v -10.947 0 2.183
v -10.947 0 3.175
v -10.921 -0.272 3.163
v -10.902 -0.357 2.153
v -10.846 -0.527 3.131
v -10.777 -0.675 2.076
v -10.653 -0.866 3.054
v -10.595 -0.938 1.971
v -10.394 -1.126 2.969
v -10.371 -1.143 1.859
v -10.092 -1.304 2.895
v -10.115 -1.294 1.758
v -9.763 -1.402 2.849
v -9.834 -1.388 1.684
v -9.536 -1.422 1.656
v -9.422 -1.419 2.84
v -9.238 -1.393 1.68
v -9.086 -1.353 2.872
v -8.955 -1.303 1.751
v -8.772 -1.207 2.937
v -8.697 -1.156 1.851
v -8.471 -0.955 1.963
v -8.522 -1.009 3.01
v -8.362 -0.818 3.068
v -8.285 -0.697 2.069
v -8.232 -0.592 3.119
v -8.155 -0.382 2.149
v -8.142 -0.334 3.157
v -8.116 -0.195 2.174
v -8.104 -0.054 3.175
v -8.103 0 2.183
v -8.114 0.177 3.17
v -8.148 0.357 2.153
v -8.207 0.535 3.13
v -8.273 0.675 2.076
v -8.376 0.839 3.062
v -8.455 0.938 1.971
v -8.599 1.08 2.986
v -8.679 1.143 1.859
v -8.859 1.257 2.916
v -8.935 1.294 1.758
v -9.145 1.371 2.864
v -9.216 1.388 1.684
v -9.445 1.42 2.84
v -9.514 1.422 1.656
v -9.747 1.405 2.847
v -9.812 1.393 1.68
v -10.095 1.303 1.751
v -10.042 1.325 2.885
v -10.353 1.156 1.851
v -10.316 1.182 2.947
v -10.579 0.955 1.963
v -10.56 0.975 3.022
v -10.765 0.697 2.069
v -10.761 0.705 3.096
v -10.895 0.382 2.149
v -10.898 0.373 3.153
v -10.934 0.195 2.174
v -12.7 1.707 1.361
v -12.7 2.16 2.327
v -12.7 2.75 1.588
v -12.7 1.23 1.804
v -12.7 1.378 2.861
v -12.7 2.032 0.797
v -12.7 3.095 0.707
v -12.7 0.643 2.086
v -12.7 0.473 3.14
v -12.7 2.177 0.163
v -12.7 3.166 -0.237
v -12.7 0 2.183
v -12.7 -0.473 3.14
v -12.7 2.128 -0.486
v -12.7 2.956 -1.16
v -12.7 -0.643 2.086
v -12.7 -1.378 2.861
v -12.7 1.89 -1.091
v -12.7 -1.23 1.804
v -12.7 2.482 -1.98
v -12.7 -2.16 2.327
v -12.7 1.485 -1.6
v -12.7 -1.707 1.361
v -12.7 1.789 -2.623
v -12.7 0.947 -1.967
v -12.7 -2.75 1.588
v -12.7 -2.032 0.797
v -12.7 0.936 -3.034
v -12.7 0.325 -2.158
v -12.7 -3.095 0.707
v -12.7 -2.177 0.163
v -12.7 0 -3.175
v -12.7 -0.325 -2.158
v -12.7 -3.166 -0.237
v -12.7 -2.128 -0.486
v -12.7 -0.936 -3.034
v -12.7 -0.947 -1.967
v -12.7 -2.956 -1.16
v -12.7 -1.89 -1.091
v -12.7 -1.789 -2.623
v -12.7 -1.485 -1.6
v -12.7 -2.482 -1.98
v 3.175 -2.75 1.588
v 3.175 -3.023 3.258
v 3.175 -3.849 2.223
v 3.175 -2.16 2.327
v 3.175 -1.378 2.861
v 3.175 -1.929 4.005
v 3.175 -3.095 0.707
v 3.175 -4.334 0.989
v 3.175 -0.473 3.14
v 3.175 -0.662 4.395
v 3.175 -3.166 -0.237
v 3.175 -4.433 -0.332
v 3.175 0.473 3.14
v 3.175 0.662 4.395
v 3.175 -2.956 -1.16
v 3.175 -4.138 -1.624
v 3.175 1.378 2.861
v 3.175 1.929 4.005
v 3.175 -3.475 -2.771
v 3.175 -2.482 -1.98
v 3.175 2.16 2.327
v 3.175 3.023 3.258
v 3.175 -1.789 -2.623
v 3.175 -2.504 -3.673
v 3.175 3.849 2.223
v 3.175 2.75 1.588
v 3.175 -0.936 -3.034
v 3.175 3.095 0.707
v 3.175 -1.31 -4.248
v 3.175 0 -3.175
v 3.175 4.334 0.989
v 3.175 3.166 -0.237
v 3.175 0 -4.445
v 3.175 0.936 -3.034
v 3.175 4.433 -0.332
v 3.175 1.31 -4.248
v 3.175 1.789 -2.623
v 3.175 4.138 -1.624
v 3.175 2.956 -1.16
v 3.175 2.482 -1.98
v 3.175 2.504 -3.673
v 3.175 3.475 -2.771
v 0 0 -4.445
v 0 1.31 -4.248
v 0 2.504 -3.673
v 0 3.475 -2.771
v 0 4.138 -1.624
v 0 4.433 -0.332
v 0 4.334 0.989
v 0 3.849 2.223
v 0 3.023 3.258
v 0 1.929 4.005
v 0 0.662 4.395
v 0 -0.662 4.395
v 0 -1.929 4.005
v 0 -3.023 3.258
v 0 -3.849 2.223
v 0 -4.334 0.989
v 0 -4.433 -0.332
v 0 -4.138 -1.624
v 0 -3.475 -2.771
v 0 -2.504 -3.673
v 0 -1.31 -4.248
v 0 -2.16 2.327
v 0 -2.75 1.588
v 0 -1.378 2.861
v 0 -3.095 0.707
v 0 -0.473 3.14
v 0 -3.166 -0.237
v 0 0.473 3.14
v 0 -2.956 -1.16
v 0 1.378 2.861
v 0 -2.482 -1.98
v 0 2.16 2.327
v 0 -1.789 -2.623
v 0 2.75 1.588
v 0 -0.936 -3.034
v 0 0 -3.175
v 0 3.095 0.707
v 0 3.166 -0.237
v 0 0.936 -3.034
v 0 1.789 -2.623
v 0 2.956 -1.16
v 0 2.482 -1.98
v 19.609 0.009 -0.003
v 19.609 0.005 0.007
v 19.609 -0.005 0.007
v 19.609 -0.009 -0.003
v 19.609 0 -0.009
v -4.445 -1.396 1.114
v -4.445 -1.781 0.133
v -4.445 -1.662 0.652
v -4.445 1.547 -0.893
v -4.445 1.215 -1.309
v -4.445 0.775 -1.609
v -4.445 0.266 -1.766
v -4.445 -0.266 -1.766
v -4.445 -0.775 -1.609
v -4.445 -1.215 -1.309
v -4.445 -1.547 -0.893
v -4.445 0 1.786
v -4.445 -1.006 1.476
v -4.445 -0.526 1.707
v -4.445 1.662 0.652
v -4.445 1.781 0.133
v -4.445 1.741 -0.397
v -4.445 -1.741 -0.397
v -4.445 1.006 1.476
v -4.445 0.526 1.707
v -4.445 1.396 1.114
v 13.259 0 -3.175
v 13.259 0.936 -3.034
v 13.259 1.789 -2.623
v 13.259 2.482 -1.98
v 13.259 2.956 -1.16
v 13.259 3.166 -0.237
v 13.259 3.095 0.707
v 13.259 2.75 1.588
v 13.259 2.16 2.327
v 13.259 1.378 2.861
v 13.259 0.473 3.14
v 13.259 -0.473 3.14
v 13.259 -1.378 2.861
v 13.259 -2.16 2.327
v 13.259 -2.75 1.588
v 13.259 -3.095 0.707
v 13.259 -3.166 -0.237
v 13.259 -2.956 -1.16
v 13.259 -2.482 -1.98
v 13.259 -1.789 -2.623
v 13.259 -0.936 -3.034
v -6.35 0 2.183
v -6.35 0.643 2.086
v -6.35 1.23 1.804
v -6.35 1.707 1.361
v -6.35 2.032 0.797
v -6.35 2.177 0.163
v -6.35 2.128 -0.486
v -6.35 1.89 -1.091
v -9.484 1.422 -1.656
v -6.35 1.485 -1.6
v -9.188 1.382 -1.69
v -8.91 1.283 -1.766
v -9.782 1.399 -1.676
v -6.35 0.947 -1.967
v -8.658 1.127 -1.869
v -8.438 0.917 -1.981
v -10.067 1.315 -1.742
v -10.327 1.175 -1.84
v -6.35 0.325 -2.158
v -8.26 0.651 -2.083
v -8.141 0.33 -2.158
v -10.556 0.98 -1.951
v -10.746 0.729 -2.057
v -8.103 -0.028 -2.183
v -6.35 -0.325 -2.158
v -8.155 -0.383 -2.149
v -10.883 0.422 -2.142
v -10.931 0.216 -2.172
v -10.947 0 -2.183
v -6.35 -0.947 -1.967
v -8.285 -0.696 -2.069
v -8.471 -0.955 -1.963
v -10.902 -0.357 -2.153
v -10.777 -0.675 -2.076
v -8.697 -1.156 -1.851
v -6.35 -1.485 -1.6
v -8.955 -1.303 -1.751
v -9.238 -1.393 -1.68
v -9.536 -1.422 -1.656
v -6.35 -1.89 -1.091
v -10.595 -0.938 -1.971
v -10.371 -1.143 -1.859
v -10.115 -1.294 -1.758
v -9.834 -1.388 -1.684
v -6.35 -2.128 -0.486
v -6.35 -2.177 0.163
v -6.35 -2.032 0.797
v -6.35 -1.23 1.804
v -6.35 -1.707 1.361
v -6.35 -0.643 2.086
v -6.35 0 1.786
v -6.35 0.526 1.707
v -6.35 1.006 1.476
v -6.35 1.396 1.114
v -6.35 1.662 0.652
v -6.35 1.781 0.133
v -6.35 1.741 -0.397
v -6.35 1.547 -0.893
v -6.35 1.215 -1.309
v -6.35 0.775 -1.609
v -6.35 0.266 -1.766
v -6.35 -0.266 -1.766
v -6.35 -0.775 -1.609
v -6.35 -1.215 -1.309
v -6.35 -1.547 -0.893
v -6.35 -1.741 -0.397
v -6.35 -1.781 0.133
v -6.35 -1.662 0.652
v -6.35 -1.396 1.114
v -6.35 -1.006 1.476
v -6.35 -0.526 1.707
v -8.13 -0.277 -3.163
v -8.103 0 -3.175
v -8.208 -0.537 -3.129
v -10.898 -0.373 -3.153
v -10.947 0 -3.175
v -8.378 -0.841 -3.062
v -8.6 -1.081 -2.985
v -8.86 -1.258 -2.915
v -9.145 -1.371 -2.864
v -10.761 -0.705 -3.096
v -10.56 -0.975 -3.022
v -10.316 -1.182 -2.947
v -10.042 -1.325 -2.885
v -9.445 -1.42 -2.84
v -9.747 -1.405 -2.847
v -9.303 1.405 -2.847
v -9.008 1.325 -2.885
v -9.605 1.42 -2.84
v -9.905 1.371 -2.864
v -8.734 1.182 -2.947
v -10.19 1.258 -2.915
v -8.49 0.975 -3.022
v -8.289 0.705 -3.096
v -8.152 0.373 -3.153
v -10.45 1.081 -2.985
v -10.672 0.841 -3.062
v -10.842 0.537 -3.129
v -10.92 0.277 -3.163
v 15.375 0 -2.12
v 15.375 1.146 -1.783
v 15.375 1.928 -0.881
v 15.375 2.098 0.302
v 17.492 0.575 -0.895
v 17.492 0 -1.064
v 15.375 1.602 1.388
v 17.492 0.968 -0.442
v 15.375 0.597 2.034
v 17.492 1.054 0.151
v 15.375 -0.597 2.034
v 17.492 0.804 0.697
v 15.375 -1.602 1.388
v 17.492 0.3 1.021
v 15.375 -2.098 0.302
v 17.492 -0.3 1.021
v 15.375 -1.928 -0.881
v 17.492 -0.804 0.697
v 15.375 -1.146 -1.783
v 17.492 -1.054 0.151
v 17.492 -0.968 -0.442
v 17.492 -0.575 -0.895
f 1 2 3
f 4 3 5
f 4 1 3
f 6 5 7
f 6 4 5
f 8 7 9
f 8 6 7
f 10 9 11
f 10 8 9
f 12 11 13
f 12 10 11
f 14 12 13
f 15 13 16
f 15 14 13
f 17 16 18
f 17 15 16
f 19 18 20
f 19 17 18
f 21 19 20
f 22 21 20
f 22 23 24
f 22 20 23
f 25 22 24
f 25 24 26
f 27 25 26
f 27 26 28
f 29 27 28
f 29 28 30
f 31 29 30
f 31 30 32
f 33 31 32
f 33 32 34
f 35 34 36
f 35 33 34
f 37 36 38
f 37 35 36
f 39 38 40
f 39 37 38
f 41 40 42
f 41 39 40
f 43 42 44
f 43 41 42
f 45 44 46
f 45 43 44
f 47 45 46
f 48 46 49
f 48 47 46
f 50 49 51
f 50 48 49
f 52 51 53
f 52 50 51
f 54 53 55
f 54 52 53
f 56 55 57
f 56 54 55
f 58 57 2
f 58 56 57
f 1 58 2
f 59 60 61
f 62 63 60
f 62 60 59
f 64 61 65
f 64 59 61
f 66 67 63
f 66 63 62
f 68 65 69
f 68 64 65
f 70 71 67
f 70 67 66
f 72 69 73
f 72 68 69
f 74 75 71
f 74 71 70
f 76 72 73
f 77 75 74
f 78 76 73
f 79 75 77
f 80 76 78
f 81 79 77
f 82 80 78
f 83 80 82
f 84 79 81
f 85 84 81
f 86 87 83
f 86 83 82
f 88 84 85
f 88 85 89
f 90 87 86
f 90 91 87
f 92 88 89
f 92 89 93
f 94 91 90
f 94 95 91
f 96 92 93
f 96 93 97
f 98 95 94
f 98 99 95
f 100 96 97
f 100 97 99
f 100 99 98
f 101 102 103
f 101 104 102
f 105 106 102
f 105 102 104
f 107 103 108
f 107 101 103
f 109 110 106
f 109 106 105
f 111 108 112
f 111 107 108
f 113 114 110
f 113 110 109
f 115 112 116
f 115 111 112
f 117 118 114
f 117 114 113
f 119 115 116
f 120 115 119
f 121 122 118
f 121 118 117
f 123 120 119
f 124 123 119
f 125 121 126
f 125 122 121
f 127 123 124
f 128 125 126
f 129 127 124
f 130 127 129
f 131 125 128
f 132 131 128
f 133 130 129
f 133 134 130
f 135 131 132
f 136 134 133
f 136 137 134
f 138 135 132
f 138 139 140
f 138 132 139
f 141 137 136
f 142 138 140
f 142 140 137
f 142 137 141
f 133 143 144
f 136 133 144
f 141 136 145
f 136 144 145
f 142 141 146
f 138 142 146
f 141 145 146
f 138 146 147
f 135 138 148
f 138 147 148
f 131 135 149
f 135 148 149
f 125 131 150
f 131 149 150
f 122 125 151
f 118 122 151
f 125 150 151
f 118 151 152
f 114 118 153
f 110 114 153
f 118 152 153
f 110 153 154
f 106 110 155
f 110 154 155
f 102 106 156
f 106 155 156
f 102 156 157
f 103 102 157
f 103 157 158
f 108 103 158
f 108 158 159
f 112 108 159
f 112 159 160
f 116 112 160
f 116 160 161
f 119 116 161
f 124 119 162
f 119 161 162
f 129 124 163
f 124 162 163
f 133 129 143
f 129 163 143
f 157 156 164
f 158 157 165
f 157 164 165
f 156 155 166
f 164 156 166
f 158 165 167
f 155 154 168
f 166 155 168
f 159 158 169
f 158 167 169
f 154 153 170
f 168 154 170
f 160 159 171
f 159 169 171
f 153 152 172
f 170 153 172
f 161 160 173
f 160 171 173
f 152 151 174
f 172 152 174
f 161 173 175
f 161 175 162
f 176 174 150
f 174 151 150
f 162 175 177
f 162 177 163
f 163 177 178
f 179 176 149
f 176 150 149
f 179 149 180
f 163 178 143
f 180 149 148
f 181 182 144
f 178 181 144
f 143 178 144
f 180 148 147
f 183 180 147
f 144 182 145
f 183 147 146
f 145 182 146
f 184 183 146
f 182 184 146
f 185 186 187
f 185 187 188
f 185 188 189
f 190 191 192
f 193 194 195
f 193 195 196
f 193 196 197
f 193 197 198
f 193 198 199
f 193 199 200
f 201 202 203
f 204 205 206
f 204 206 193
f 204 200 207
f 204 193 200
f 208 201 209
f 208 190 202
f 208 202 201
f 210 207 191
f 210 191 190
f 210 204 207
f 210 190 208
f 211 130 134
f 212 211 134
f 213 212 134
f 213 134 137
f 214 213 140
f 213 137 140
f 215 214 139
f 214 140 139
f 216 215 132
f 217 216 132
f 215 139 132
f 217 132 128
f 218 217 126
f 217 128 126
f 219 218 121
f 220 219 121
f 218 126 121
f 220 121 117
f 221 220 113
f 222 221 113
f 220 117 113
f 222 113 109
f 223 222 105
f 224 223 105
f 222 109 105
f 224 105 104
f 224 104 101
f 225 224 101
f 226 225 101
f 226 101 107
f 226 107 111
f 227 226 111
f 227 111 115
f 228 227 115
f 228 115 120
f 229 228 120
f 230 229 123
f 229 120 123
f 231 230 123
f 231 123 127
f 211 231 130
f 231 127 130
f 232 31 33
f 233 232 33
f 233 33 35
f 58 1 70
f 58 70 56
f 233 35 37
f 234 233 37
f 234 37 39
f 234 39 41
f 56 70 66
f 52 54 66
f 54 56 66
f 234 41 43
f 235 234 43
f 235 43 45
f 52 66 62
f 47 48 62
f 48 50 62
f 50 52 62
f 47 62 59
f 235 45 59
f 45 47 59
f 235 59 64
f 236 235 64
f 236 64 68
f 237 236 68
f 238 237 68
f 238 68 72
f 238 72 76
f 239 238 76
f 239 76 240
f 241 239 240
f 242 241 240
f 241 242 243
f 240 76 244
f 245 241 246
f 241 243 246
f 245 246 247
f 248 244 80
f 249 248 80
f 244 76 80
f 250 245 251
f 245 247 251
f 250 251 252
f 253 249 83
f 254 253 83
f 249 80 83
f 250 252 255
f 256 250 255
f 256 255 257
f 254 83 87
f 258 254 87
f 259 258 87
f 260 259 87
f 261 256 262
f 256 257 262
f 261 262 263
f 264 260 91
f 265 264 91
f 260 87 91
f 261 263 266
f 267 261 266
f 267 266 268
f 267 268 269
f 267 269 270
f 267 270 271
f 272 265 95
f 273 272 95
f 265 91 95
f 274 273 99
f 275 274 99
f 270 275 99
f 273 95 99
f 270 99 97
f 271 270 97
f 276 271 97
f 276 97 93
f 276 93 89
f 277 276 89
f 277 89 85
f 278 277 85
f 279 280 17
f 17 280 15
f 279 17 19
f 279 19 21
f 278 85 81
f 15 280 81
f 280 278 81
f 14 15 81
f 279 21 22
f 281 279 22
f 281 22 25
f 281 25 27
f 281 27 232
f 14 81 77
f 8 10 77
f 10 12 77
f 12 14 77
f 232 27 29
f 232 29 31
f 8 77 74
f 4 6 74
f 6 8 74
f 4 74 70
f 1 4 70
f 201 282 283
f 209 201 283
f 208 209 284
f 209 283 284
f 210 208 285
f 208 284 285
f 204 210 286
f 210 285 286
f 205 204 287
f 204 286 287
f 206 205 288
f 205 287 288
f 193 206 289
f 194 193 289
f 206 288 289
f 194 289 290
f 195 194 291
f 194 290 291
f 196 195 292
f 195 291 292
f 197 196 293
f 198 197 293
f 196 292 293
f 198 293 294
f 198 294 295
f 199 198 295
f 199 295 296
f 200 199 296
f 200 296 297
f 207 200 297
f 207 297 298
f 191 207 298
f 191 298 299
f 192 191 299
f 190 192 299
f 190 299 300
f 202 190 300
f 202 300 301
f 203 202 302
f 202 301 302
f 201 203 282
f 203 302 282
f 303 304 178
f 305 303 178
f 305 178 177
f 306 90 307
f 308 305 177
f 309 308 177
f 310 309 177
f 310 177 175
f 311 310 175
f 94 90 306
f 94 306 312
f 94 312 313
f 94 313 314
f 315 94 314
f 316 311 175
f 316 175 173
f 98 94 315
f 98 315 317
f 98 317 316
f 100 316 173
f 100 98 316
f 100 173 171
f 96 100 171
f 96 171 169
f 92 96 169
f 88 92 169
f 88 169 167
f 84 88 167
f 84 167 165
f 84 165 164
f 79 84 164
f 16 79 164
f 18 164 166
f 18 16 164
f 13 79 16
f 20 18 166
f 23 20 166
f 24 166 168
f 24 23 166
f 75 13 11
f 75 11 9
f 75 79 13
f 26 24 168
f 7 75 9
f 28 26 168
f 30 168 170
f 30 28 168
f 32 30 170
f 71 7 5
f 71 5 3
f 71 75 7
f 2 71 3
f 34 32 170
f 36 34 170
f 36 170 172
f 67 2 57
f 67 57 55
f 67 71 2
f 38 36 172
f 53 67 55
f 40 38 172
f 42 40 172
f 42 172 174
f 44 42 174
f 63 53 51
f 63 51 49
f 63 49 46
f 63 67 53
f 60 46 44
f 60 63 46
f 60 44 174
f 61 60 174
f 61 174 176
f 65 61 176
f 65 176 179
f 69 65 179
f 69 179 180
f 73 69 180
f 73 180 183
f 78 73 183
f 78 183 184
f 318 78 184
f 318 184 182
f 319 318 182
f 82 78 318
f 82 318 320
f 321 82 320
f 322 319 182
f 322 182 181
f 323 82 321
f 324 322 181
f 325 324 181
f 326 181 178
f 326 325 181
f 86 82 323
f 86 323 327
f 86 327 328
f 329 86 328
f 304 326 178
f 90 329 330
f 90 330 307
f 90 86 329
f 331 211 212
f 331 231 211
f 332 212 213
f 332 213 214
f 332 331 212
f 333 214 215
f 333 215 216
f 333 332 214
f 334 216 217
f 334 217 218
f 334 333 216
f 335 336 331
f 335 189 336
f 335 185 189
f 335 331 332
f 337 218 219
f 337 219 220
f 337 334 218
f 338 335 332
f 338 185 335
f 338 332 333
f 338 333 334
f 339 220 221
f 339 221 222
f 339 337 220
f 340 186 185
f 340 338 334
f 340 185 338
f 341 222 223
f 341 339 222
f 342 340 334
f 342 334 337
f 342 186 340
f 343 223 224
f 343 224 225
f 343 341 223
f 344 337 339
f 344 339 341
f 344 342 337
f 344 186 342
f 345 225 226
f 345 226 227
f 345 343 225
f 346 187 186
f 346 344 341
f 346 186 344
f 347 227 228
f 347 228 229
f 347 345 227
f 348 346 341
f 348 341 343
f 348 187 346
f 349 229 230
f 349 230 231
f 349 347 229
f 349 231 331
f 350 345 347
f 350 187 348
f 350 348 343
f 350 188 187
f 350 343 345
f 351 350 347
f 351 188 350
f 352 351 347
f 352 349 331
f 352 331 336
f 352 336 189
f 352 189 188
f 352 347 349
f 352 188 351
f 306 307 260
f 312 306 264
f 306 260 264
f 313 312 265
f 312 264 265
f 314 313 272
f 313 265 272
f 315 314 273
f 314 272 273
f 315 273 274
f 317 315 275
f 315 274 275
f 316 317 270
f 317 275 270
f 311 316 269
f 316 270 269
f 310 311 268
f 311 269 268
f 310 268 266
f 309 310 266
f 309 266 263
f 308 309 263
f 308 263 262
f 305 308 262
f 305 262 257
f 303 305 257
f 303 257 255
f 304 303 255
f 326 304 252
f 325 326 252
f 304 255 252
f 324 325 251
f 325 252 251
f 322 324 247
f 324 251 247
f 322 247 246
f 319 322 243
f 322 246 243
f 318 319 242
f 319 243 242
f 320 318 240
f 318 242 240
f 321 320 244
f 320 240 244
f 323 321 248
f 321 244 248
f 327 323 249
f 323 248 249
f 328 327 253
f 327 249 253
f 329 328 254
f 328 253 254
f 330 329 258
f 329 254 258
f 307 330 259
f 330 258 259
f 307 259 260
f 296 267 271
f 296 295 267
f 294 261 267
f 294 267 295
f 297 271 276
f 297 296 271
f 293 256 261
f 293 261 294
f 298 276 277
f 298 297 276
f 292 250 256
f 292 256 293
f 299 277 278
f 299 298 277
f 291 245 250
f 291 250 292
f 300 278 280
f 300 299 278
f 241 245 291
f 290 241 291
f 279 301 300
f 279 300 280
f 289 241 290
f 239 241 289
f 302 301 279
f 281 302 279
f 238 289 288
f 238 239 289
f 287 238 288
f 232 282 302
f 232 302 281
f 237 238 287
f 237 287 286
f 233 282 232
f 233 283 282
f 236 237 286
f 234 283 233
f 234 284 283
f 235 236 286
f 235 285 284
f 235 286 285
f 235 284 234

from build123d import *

# Parameters (mm, degrees)
SKETCH1_R                      = 4.445
BOSS_EXTRUDE1_DEPTH            = 3.175
SKETCH2_R                      = 3.175
BOSS_EXTRUDE2_DEPTH            = 16.4338
BOSS_EXTRUDE3_START            = 12.7
SKETCH3_R                      = 3.175
BOSS_EXTRUDE3_DEPTH            = 12.7
CHAMFER1_SIZE                  = 6.35
CHAMFER1_SIZE2                 = 3.165993211
SKETCH4_R                      = 2.1828125
CUT_EXTRUDE1_DEPTH             = 6.35
SKETCH5_R                      = 1.7859375
CUT_EXTRUDE2_DEPTH             = 1.905
CUT_EXTRUDE5_REACH             = 22.592
CUT_EXTRUDE5_END_RADIUS        = 3.175
SKETCH7_R                      = 1.4224
CUT_EXTRUDE5_DIRECTION_2_DEPTH = 21.591772324


with BuildPart() as part:
    # Sketch1 → Boss-Extrude1 (new body)
    with BuildSketch(Plane(origin=(0, 0, 0), x_dir=(0, 0, -1), z_dir=(1, 0, 0))):
        Circle(SKETCH1_R)
    extrude(amount=BOSS_EXTRUDE1_DEPTH)

    # Sketch2 → Boss-Extrude2 (add)
    with BuildSketch(Plane(origin=(3.175, 0, 0), x_dir=(0, 0, -1), z_dir=(1, 0, 0))):
        Circle(SKETCH2_R)
    extrude(amount=BOSS_EXTRUDE2_DEPTH)

    # Sketch3 → Boss-Extrude3 (add)
    with BuildSketch(Plane.ZY.offset(BOSS_EXTRUDE3_START)):
        Circle(SKETCH3_R)
    extrude(amount=-BOSS_EXTRUDE3_DEPTH)

    # Chamfer1
    chamfer1_edges = [part.edges().sort_by_distance(p)[0] for p in [
        (19.6088, 0, 3.175),
    ]]
    chamfer1_side = [part.faces().sort_by_distance(p)[0] for p in [
        (11.3919, 0, 3.175),
    ]]
    chamfer(chamfer1_edges, length=CHAMFER1_SIZE, length2=CHAMFER1_SIZE2, reference=chamfer1_side[0])

    # Sketch4 → Cut-Extrude1 (cut)
    with BuildSketch(Plane.ZY.offset(12.7)):
        Circle(SKETCH4_R)
    extrude(amount=-CUT_EXTRUDE1_DEPTH, mode=Mode.SUBTRACT)

    # Sketch5 → Cut-Extrude2 (cut)
    with BuildSketch(Plane.ZY.offset(6.35)):
        Circle(SKETCH5_R)
    extrude(amount=-CUT_EXTRUDE2_DEPTH, mode=Mode.SUBTRACT)

    # Cut-Extrude5: up to this cylinder (the profile starts inside it)
    cut_extrude5_end = Plane(origin=(-9.525, 0, 0), z_dir=(1, 0, 0)) * Cylinder(CUT_EXTRUDE5_END_RADIUS, 52.534, mode=Mode.PRIVATE)
    # Sketch7 → Cut-Extrude5 (cut, up to the surface)
    with BuildSketch(Plane.XY, mode=Mode.PRIVATE) as cut_extrude5_sk1:
        with Locations((-9.525, 0)):
            Circle(SKETCH7_R)
    cut_extrude5_tool1 = extrude(cut_extrude5_sk1.sketch, amount=CUT_EXTRUDE5_REACH, mode=Mode.PRIVATE) & cut_extrude5_end
    add(cut_extrude5_tool1.solids().sort_by_distance((-9.525, 0, 0))[0], mode=Mode.SUBTRACT)

    # Sketch7 → Cut-Extrude5 direction 2 (cut)
    with BuildSketch(Plane.XY):
        with Locations((-9.525, 0)):
            Circle(SKETCH7_R)
    extrude(amount=-CUT_EXTRUDE5_DIRECTION_2_DEPTH, mode=Mode.SUBTRACT)


solid = part.part
